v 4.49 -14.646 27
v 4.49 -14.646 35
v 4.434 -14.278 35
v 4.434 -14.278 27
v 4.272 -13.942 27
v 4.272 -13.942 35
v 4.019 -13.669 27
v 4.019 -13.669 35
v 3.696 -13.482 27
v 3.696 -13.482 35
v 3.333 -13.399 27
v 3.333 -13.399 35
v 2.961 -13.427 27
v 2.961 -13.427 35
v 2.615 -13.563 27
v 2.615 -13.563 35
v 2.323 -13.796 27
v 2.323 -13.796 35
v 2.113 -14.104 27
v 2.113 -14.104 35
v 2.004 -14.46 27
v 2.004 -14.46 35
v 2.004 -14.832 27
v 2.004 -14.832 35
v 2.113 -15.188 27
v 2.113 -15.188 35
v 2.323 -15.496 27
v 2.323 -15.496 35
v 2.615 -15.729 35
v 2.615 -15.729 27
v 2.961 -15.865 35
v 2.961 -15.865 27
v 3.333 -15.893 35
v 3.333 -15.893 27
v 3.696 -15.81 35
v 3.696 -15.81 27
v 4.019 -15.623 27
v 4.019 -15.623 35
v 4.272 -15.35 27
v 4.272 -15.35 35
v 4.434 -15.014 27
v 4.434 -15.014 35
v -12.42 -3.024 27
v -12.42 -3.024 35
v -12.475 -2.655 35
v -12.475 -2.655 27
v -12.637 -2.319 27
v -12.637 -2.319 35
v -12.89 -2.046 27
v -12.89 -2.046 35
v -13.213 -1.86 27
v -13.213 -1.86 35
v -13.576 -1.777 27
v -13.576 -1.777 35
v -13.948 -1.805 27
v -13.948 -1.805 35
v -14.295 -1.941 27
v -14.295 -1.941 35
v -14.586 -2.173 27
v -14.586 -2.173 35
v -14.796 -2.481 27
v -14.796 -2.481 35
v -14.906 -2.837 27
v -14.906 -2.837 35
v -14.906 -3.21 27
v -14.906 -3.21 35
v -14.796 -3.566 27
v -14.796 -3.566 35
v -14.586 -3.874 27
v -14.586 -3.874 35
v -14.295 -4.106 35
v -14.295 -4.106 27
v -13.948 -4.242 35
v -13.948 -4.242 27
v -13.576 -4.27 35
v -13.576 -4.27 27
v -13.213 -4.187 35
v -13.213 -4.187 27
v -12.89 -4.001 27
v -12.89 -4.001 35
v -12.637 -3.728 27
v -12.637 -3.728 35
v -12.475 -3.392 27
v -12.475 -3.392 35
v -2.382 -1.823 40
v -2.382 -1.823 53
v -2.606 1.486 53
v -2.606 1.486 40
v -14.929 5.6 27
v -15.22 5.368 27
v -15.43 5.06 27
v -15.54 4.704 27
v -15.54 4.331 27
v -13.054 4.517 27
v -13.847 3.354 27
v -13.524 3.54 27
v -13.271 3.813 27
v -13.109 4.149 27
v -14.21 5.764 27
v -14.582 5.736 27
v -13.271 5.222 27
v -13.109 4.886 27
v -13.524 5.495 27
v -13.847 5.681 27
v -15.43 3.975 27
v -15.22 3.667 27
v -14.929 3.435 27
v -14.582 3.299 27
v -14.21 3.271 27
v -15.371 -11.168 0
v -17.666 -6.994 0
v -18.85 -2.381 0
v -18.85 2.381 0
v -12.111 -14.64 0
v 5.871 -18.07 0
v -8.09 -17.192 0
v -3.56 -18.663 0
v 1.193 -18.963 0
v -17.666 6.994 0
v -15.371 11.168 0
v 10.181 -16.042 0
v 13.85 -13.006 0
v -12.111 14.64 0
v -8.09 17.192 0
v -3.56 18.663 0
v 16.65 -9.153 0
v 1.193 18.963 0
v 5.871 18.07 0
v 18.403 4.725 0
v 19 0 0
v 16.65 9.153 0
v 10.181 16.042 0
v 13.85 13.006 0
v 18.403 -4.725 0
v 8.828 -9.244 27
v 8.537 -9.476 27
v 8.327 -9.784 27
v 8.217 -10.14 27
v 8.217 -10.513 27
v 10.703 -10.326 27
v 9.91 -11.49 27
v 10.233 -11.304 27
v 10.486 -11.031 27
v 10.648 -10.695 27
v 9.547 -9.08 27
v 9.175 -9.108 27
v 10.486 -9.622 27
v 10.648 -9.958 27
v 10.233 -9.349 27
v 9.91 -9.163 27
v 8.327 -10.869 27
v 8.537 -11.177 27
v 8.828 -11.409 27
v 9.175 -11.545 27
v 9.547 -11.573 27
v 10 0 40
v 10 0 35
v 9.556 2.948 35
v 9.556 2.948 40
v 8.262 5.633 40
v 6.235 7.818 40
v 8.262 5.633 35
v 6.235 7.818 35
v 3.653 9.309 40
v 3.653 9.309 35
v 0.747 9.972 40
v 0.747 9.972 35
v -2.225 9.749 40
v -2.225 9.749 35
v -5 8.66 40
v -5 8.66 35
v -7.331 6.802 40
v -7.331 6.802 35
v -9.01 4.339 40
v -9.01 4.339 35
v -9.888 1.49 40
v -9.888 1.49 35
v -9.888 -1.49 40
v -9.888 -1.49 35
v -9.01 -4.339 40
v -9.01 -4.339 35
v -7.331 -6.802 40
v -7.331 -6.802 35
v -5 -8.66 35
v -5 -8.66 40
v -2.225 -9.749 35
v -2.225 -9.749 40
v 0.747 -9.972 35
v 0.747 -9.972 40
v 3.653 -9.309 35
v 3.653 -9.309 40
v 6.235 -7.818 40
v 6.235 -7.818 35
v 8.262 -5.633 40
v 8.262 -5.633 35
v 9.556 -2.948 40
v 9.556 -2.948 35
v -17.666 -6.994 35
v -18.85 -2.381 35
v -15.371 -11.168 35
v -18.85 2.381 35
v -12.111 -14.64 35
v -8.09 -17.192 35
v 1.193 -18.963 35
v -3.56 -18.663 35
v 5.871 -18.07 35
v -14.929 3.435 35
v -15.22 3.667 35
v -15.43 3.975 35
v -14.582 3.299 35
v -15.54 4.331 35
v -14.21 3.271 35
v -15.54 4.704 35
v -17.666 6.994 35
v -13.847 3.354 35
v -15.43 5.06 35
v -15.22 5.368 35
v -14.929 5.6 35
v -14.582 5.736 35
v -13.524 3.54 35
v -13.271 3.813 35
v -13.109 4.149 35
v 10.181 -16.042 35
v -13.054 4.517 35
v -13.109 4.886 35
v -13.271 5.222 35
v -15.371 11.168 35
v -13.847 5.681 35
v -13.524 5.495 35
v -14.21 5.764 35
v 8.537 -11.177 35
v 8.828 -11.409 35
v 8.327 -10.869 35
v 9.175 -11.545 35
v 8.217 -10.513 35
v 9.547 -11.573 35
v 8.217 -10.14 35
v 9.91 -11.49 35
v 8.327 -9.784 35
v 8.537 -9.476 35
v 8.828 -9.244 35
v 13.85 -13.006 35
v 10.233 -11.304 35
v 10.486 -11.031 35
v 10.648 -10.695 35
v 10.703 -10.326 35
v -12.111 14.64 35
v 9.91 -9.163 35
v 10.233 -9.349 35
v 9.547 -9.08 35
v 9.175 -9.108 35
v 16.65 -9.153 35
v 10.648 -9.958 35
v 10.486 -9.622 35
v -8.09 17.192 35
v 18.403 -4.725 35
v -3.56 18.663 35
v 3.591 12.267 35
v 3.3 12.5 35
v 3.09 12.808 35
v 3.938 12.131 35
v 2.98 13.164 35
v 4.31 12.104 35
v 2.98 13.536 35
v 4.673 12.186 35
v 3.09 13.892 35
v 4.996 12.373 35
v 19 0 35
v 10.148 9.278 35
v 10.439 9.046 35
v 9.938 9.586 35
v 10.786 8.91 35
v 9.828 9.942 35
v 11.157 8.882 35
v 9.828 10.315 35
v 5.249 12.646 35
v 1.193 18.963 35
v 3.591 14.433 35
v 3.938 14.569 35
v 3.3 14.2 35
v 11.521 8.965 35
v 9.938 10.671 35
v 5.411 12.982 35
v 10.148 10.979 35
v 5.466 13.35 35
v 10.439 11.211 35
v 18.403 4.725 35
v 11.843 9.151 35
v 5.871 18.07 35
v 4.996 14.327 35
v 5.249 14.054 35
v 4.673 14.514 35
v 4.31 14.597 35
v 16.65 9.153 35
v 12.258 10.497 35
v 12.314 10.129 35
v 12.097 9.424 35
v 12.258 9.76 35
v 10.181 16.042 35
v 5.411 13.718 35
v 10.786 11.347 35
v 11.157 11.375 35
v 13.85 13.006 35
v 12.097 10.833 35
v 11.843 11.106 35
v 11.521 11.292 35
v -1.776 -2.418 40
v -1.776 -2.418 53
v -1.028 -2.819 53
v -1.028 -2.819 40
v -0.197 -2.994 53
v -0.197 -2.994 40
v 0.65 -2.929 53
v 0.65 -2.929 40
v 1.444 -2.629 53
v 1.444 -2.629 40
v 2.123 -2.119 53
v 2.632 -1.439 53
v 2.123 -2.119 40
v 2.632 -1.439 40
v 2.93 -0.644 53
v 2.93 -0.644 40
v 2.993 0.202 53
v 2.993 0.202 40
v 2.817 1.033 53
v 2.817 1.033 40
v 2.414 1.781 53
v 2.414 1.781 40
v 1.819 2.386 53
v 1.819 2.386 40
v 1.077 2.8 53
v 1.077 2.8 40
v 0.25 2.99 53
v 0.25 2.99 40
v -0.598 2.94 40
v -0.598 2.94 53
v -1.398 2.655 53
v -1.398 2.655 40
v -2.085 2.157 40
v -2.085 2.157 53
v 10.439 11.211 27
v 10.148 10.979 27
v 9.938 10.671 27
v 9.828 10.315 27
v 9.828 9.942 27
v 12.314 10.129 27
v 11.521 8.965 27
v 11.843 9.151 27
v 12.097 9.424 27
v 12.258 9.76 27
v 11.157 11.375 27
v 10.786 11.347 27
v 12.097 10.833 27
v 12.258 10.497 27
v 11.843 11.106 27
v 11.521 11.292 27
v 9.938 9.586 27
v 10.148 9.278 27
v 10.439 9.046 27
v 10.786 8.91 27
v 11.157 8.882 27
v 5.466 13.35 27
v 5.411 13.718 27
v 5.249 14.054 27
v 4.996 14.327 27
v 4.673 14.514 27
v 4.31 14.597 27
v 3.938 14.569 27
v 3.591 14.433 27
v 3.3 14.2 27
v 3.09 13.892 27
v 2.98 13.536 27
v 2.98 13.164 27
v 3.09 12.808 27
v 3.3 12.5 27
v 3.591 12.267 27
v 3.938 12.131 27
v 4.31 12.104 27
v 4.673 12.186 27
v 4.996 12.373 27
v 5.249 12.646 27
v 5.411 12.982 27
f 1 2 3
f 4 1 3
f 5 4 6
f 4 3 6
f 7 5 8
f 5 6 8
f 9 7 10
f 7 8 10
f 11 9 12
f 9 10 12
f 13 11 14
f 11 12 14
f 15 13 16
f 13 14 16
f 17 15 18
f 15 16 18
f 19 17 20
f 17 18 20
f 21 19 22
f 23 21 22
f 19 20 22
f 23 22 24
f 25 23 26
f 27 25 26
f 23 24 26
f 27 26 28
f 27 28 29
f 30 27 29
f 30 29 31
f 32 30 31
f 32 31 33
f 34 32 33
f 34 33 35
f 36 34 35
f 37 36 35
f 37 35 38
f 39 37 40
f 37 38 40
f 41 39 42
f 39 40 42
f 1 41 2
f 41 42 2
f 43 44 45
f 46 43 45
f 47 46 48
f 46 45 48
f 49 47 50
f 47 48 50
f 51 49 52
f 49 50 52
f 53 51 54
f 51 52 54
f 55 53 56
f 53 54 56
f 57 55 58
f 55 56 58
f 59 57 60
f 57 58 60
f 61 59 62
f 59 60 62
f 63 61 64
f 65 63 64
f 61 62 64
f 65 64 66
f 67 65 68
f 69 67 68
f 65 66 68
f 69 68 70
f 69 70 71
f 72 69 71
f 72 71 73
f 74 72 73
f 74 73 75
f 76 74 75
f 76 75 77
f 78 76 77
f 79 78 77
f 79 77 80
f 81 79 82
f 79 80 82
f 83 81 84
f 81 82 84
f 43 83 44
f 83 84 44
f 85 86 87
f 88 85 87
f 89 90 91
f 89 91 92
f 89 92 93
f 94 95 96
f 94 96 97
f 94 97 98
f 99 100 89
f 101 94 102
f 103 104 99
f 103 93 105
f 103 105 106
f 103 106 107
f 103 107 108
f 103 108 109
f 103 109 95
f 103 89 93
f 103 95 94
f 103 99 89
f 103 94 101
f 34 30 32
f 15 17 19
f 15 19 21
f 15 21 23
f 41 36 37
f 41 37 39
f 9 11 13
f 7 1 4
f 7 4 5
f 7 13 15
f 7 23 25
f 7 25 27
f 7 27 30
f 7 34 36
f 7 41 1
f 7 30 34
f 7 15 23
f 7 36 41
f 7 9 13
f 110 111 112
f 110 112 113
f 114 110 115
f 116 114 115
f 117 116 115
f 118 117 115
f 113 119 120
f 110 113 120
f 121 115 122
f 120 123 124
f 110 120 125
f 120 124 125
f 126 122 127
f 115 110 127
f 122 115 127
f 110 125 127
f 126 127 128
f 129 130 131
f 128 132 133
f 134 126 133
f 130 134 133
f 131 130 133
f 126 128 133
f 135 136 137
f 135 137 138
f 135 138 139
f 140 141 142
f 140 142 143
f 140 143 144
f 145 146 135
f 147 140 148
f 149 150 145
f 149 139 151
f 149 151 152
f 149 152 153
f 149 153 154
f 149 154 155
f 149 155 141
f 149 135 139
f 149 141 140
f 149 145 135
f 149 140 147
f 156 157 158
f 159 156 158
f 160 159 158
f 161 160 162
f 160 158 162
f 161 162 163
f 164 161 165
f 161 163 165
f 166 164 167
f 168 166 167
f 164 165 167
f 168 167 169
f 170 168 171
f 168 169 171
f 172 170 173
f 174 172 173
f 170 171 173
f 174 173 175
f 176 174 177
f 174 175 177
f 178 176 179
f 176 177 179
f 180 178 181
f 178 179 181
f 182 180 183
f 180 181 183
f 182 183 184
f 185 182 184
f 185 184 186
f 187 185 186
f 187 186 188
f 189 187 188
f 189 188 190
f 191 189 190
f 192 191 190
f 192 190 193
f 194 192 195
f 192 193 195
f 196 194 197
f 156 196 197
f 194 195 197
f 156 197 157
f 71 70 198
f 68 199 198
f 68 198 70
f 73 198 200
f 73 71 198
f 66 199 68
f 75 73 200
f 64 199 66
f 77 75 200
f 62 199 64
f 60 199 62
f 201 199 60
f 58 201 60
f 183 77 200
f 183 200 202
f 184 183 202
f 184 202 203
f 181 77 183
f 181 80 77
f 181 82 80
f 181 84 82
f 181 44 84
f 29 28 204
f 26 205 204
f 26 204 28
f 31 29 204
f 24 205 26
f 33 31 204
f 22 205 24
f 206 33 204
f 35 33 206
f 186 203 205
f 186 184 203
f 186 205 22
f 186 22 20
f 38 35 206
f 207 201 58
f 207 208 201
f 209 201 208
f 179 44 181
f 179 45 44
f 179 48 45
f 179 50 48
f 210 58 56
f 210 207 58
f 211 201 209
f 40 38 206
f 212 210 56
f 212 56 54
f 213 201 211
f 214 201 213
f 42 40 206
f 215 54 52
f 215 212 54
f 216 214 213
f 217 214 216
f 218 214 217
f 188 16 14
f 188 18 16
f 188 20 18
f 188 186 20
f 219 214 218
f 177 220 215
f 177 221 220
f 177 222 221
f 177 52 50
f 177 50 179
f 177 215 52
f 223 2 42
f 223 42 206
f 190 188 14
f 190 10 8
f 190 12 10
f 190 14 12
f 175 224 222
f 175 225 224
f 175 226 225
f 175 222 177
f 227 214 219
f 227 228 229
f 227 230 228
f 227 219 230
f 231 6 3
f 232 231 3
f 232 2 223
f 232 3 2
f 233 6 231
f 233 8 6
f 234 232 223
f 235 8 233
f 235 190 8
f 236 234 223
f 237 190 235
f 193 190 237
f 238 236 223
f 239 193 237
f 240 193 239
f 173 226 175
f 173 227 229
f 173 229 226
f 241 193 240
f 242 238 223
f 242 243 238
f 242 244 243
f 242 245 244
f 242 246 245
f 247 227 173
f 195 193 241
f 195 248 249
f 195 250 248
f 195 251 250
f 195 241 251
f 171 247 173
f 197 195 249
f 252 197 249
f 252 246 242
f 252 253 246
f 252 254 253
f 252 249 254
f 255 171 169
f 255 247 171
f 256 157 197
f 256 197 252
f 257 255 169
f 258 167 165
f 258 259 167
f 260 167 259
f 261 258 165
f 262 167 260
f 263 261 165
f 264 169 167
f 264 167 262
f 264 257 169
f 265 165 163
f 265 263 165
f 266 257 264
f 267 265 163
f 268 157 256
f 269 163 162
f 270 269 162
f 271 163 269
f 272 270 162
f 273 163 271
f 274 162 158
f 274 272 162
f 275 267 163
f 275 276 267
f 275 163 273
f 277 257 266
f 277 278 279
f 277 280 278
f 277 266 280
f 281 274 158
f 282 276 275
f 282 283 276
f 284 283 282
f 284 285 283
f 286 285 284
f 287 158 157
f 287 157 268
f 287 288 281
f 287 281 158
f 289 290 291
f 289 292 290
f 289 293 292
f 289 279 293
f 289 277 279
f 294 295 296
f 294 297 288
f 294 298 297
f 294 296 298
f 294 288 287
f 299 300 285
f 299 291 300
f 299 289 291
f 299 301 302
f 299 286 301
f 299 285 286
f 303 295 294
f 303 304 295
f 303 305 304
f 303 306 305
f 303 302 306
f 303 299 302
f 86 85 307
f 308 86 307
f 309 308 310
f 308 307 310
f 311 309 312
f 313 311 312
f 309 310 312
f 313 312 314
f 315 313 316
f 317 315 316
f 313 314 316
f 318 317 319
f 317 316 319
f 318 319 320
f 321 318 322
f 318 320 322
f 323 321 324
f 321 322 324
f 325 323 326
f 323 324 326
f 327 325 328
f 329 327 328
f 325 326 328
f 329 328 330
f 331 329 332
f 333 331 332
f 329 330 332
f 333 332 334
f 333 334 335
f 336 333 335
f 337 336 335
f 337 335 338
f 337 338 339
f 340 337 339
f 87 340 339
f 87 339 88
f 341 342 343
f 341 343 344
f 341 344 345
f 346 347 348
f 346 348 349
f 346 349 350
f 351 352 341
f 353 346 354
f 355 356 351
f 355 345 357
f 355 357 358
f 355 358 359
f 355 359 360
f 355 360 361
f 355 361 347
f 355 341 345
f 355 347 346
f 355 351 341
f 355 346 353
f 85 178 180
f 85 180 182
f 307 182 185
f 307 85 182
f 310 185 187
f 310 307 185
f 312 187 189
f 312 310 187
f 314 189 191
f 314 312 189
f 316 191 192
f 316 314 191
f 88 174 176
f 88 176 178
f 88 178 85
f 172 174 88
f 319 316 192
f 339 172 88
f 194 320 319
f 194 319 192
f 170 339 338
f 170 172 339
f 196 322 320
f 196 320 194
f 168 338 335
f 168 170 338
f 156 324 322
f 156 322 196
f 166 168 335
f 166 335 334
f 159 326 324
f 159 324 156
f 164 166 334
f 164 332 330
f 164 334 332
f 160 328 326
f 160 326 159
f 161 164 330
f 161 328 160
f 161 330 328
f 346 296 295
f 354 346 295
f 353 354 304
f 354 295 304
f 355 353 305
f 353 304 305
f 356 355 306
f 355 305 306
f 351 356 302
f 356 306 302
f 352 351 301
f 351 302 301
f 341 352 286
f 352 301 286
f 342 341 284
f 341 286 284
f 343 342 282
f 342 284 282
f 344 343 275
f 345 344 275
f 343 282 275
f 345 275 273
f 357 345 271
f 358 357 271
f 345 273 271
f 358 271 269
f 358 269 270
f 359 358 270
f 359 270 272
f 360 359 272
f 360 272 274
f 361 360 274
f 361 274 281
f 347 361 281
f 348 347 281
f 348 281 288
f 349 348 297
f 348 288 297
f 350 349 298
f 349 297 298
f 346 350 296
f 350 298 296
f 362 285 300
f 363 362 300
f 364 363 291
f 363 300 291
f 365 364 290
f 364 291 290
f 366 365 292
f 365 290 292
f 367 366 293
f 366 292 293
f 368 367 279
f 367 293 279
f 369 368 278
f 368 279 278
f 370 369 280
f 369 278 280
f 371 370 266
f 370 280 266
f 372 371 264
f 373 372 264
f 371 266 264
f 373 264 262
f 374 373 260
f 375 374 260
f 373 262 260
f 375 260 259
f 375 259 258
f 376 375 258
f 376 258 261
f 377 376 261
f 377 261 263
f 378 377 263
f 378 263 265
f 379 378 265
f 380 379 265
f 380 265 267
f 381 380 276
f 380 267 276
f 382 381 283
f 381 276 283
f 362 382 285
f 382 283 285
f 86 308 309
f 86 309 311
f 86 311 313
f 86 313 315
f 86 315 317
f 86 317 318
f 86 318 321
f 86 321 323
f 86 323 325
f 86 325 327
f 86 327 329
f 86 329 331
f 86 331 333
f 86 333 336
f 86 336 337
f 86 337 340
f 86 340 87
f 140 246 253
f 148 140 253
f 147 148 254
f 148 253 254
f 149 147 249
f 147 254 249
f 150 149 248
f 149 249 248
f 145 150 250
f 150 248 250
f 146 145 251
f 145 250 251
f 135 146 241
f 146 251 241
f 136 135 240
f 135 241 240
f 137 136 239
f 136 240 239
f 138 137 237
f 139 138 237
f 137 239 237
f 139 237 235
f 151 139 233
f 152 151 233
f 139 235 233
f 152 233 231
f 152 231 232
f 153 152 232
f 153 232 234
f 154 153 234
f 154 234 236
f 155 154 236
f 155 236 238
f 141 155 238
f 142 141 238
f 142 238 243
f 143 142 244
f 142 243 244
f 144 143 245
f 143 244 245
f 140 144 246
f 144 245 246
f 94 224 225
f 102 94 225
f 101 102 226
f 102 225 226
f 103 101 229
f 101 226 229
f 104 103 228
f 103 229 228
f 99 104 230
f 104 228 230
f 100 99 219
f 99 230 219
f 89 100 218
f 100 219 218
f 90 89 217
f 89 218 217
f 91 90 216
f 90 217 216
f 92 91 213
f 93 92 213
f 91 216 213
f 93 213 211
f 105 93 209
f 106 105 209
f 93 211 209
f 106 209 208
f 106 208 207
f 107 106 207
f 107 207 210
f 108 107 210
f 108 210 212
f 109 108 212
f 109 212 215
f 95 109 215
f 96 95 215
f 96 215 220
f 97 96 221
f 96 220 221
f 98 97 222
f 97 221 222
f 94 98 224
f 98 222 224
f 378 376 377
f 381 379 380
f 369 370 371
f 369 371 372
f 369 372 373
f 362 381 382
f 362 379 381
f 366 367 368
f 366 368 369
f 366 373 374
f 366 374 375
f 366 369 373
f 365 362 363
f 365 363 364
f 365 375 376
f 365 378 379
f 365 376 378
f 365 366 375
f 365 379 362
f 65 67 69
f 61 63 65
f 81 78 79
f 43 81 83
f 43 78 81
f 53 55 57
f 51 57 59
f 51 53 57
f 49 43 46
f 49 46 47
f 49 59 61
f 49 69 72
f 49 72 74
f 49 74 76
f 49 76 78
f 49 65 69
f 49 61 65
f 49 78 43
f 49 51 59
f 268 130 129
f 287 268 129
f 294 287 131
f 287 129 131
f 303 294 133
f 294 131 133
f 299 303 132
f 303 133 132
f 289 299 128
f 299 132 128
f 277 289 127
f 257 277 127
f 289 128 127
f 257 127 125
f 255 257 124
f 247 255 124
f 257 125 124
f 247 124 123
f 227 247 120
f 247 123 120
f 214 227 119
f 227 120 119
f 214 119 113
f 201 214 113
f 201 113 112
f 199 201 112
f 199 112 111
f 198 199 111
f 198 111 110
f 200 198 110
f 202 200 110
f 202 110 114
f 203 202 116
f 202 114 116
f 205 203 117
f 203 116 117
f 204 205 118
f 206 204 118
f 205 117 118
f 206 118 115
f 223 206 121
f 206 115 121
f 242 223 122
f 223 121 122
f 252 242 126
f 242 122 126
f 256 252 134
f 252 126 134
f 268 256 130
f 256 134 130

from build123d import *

# Parameters (mm, degrees)
ESQUISSE1_R             = 19
BOSS_EXTRU_1_DEPTH      = 35
ESQUISSE2_R             = 10
BOSS_EXTRU_2_DEPTH      = 5
ESQUISSE3_R             = 3
BOSS_EXTRU_3_DEPTH      = 13
ESQUISSE4_R             = 1.25
ENL_V_MAT_EXTRU_1_DEPTH = 8
ENL_V_MAT_EXTRU_2_DEPTH = 13


with BuildPart() as part:
    # Esquisse1 → Boss.-Extru.1 (new body)
    with BuildSketch(Plane.XY):
        Circle(ESQUISSE1_R)
    extrude(amount=BOSS_EXTRU_1_DEPTH)

    # Esquisse2 → Boss.-Extru.2 (add)
    with BuildSketch(Plane.XY.offset(35)):
        Circle(ESQUISSE2_R)
    extrude(amount=BOSS_EXTRU_2_DEPTH)

    # Esquisse3 → Boss.-Extru.3 (add)
    with BuildSketch(Plane.XY.offset(40)):
        with Locations(Location((0, 0, 0), (0, 0, 180))):
            Circle(ESQUISSE3_R)
    extrude(amount=BOSS_EXTRU_3_DEPTH)

    # Esquisse4 → Enlèv. mat.-Extru.1 (cut)
    with BuildSketch(Plane.XY.offset(35)):
        with Locations((3.239548848, -14.646000248)):
            Circle(ESQUISSE4_R)
        with Locations((9.453296275, -10.326431598)):
            Circle(ESQUISSE4_R)
        with Locations((-13.669600231, -3.023578925)):
            Circle(ESQUISSE4_R)
        with Locations((-14.303582703, 4.517468525)):
            Circle(ESQUISSE4_R)
        with Locations((4.216303956, 13.350010522)):
            Circle(ESQUISSE4_R)
        with Locations((11.064033854, 10.128531723)):
            Circle(ESQUISSE4_R)
    extrude(amount=-ENL_V_MAT_EXTRU_1_DEPTH, mode=Mode.SUBTRACT)

    # Esquisse6 → Enlèv. mat.-Extru.2 (cut)
    with BuildSketch(Plane.XY.offset(53)):
        Polygon((-2.382419019, -1.823205862), (-2.606187886, 1.485861604), (-6.139376272, 1.246937022), (-5.915607406, -2.062130444), align=None)
    extrude(amount=-ENL_V_MAT_EXTRU_2_DEPTH, mode=Mode.SUBTRACT)


solid = part.part
